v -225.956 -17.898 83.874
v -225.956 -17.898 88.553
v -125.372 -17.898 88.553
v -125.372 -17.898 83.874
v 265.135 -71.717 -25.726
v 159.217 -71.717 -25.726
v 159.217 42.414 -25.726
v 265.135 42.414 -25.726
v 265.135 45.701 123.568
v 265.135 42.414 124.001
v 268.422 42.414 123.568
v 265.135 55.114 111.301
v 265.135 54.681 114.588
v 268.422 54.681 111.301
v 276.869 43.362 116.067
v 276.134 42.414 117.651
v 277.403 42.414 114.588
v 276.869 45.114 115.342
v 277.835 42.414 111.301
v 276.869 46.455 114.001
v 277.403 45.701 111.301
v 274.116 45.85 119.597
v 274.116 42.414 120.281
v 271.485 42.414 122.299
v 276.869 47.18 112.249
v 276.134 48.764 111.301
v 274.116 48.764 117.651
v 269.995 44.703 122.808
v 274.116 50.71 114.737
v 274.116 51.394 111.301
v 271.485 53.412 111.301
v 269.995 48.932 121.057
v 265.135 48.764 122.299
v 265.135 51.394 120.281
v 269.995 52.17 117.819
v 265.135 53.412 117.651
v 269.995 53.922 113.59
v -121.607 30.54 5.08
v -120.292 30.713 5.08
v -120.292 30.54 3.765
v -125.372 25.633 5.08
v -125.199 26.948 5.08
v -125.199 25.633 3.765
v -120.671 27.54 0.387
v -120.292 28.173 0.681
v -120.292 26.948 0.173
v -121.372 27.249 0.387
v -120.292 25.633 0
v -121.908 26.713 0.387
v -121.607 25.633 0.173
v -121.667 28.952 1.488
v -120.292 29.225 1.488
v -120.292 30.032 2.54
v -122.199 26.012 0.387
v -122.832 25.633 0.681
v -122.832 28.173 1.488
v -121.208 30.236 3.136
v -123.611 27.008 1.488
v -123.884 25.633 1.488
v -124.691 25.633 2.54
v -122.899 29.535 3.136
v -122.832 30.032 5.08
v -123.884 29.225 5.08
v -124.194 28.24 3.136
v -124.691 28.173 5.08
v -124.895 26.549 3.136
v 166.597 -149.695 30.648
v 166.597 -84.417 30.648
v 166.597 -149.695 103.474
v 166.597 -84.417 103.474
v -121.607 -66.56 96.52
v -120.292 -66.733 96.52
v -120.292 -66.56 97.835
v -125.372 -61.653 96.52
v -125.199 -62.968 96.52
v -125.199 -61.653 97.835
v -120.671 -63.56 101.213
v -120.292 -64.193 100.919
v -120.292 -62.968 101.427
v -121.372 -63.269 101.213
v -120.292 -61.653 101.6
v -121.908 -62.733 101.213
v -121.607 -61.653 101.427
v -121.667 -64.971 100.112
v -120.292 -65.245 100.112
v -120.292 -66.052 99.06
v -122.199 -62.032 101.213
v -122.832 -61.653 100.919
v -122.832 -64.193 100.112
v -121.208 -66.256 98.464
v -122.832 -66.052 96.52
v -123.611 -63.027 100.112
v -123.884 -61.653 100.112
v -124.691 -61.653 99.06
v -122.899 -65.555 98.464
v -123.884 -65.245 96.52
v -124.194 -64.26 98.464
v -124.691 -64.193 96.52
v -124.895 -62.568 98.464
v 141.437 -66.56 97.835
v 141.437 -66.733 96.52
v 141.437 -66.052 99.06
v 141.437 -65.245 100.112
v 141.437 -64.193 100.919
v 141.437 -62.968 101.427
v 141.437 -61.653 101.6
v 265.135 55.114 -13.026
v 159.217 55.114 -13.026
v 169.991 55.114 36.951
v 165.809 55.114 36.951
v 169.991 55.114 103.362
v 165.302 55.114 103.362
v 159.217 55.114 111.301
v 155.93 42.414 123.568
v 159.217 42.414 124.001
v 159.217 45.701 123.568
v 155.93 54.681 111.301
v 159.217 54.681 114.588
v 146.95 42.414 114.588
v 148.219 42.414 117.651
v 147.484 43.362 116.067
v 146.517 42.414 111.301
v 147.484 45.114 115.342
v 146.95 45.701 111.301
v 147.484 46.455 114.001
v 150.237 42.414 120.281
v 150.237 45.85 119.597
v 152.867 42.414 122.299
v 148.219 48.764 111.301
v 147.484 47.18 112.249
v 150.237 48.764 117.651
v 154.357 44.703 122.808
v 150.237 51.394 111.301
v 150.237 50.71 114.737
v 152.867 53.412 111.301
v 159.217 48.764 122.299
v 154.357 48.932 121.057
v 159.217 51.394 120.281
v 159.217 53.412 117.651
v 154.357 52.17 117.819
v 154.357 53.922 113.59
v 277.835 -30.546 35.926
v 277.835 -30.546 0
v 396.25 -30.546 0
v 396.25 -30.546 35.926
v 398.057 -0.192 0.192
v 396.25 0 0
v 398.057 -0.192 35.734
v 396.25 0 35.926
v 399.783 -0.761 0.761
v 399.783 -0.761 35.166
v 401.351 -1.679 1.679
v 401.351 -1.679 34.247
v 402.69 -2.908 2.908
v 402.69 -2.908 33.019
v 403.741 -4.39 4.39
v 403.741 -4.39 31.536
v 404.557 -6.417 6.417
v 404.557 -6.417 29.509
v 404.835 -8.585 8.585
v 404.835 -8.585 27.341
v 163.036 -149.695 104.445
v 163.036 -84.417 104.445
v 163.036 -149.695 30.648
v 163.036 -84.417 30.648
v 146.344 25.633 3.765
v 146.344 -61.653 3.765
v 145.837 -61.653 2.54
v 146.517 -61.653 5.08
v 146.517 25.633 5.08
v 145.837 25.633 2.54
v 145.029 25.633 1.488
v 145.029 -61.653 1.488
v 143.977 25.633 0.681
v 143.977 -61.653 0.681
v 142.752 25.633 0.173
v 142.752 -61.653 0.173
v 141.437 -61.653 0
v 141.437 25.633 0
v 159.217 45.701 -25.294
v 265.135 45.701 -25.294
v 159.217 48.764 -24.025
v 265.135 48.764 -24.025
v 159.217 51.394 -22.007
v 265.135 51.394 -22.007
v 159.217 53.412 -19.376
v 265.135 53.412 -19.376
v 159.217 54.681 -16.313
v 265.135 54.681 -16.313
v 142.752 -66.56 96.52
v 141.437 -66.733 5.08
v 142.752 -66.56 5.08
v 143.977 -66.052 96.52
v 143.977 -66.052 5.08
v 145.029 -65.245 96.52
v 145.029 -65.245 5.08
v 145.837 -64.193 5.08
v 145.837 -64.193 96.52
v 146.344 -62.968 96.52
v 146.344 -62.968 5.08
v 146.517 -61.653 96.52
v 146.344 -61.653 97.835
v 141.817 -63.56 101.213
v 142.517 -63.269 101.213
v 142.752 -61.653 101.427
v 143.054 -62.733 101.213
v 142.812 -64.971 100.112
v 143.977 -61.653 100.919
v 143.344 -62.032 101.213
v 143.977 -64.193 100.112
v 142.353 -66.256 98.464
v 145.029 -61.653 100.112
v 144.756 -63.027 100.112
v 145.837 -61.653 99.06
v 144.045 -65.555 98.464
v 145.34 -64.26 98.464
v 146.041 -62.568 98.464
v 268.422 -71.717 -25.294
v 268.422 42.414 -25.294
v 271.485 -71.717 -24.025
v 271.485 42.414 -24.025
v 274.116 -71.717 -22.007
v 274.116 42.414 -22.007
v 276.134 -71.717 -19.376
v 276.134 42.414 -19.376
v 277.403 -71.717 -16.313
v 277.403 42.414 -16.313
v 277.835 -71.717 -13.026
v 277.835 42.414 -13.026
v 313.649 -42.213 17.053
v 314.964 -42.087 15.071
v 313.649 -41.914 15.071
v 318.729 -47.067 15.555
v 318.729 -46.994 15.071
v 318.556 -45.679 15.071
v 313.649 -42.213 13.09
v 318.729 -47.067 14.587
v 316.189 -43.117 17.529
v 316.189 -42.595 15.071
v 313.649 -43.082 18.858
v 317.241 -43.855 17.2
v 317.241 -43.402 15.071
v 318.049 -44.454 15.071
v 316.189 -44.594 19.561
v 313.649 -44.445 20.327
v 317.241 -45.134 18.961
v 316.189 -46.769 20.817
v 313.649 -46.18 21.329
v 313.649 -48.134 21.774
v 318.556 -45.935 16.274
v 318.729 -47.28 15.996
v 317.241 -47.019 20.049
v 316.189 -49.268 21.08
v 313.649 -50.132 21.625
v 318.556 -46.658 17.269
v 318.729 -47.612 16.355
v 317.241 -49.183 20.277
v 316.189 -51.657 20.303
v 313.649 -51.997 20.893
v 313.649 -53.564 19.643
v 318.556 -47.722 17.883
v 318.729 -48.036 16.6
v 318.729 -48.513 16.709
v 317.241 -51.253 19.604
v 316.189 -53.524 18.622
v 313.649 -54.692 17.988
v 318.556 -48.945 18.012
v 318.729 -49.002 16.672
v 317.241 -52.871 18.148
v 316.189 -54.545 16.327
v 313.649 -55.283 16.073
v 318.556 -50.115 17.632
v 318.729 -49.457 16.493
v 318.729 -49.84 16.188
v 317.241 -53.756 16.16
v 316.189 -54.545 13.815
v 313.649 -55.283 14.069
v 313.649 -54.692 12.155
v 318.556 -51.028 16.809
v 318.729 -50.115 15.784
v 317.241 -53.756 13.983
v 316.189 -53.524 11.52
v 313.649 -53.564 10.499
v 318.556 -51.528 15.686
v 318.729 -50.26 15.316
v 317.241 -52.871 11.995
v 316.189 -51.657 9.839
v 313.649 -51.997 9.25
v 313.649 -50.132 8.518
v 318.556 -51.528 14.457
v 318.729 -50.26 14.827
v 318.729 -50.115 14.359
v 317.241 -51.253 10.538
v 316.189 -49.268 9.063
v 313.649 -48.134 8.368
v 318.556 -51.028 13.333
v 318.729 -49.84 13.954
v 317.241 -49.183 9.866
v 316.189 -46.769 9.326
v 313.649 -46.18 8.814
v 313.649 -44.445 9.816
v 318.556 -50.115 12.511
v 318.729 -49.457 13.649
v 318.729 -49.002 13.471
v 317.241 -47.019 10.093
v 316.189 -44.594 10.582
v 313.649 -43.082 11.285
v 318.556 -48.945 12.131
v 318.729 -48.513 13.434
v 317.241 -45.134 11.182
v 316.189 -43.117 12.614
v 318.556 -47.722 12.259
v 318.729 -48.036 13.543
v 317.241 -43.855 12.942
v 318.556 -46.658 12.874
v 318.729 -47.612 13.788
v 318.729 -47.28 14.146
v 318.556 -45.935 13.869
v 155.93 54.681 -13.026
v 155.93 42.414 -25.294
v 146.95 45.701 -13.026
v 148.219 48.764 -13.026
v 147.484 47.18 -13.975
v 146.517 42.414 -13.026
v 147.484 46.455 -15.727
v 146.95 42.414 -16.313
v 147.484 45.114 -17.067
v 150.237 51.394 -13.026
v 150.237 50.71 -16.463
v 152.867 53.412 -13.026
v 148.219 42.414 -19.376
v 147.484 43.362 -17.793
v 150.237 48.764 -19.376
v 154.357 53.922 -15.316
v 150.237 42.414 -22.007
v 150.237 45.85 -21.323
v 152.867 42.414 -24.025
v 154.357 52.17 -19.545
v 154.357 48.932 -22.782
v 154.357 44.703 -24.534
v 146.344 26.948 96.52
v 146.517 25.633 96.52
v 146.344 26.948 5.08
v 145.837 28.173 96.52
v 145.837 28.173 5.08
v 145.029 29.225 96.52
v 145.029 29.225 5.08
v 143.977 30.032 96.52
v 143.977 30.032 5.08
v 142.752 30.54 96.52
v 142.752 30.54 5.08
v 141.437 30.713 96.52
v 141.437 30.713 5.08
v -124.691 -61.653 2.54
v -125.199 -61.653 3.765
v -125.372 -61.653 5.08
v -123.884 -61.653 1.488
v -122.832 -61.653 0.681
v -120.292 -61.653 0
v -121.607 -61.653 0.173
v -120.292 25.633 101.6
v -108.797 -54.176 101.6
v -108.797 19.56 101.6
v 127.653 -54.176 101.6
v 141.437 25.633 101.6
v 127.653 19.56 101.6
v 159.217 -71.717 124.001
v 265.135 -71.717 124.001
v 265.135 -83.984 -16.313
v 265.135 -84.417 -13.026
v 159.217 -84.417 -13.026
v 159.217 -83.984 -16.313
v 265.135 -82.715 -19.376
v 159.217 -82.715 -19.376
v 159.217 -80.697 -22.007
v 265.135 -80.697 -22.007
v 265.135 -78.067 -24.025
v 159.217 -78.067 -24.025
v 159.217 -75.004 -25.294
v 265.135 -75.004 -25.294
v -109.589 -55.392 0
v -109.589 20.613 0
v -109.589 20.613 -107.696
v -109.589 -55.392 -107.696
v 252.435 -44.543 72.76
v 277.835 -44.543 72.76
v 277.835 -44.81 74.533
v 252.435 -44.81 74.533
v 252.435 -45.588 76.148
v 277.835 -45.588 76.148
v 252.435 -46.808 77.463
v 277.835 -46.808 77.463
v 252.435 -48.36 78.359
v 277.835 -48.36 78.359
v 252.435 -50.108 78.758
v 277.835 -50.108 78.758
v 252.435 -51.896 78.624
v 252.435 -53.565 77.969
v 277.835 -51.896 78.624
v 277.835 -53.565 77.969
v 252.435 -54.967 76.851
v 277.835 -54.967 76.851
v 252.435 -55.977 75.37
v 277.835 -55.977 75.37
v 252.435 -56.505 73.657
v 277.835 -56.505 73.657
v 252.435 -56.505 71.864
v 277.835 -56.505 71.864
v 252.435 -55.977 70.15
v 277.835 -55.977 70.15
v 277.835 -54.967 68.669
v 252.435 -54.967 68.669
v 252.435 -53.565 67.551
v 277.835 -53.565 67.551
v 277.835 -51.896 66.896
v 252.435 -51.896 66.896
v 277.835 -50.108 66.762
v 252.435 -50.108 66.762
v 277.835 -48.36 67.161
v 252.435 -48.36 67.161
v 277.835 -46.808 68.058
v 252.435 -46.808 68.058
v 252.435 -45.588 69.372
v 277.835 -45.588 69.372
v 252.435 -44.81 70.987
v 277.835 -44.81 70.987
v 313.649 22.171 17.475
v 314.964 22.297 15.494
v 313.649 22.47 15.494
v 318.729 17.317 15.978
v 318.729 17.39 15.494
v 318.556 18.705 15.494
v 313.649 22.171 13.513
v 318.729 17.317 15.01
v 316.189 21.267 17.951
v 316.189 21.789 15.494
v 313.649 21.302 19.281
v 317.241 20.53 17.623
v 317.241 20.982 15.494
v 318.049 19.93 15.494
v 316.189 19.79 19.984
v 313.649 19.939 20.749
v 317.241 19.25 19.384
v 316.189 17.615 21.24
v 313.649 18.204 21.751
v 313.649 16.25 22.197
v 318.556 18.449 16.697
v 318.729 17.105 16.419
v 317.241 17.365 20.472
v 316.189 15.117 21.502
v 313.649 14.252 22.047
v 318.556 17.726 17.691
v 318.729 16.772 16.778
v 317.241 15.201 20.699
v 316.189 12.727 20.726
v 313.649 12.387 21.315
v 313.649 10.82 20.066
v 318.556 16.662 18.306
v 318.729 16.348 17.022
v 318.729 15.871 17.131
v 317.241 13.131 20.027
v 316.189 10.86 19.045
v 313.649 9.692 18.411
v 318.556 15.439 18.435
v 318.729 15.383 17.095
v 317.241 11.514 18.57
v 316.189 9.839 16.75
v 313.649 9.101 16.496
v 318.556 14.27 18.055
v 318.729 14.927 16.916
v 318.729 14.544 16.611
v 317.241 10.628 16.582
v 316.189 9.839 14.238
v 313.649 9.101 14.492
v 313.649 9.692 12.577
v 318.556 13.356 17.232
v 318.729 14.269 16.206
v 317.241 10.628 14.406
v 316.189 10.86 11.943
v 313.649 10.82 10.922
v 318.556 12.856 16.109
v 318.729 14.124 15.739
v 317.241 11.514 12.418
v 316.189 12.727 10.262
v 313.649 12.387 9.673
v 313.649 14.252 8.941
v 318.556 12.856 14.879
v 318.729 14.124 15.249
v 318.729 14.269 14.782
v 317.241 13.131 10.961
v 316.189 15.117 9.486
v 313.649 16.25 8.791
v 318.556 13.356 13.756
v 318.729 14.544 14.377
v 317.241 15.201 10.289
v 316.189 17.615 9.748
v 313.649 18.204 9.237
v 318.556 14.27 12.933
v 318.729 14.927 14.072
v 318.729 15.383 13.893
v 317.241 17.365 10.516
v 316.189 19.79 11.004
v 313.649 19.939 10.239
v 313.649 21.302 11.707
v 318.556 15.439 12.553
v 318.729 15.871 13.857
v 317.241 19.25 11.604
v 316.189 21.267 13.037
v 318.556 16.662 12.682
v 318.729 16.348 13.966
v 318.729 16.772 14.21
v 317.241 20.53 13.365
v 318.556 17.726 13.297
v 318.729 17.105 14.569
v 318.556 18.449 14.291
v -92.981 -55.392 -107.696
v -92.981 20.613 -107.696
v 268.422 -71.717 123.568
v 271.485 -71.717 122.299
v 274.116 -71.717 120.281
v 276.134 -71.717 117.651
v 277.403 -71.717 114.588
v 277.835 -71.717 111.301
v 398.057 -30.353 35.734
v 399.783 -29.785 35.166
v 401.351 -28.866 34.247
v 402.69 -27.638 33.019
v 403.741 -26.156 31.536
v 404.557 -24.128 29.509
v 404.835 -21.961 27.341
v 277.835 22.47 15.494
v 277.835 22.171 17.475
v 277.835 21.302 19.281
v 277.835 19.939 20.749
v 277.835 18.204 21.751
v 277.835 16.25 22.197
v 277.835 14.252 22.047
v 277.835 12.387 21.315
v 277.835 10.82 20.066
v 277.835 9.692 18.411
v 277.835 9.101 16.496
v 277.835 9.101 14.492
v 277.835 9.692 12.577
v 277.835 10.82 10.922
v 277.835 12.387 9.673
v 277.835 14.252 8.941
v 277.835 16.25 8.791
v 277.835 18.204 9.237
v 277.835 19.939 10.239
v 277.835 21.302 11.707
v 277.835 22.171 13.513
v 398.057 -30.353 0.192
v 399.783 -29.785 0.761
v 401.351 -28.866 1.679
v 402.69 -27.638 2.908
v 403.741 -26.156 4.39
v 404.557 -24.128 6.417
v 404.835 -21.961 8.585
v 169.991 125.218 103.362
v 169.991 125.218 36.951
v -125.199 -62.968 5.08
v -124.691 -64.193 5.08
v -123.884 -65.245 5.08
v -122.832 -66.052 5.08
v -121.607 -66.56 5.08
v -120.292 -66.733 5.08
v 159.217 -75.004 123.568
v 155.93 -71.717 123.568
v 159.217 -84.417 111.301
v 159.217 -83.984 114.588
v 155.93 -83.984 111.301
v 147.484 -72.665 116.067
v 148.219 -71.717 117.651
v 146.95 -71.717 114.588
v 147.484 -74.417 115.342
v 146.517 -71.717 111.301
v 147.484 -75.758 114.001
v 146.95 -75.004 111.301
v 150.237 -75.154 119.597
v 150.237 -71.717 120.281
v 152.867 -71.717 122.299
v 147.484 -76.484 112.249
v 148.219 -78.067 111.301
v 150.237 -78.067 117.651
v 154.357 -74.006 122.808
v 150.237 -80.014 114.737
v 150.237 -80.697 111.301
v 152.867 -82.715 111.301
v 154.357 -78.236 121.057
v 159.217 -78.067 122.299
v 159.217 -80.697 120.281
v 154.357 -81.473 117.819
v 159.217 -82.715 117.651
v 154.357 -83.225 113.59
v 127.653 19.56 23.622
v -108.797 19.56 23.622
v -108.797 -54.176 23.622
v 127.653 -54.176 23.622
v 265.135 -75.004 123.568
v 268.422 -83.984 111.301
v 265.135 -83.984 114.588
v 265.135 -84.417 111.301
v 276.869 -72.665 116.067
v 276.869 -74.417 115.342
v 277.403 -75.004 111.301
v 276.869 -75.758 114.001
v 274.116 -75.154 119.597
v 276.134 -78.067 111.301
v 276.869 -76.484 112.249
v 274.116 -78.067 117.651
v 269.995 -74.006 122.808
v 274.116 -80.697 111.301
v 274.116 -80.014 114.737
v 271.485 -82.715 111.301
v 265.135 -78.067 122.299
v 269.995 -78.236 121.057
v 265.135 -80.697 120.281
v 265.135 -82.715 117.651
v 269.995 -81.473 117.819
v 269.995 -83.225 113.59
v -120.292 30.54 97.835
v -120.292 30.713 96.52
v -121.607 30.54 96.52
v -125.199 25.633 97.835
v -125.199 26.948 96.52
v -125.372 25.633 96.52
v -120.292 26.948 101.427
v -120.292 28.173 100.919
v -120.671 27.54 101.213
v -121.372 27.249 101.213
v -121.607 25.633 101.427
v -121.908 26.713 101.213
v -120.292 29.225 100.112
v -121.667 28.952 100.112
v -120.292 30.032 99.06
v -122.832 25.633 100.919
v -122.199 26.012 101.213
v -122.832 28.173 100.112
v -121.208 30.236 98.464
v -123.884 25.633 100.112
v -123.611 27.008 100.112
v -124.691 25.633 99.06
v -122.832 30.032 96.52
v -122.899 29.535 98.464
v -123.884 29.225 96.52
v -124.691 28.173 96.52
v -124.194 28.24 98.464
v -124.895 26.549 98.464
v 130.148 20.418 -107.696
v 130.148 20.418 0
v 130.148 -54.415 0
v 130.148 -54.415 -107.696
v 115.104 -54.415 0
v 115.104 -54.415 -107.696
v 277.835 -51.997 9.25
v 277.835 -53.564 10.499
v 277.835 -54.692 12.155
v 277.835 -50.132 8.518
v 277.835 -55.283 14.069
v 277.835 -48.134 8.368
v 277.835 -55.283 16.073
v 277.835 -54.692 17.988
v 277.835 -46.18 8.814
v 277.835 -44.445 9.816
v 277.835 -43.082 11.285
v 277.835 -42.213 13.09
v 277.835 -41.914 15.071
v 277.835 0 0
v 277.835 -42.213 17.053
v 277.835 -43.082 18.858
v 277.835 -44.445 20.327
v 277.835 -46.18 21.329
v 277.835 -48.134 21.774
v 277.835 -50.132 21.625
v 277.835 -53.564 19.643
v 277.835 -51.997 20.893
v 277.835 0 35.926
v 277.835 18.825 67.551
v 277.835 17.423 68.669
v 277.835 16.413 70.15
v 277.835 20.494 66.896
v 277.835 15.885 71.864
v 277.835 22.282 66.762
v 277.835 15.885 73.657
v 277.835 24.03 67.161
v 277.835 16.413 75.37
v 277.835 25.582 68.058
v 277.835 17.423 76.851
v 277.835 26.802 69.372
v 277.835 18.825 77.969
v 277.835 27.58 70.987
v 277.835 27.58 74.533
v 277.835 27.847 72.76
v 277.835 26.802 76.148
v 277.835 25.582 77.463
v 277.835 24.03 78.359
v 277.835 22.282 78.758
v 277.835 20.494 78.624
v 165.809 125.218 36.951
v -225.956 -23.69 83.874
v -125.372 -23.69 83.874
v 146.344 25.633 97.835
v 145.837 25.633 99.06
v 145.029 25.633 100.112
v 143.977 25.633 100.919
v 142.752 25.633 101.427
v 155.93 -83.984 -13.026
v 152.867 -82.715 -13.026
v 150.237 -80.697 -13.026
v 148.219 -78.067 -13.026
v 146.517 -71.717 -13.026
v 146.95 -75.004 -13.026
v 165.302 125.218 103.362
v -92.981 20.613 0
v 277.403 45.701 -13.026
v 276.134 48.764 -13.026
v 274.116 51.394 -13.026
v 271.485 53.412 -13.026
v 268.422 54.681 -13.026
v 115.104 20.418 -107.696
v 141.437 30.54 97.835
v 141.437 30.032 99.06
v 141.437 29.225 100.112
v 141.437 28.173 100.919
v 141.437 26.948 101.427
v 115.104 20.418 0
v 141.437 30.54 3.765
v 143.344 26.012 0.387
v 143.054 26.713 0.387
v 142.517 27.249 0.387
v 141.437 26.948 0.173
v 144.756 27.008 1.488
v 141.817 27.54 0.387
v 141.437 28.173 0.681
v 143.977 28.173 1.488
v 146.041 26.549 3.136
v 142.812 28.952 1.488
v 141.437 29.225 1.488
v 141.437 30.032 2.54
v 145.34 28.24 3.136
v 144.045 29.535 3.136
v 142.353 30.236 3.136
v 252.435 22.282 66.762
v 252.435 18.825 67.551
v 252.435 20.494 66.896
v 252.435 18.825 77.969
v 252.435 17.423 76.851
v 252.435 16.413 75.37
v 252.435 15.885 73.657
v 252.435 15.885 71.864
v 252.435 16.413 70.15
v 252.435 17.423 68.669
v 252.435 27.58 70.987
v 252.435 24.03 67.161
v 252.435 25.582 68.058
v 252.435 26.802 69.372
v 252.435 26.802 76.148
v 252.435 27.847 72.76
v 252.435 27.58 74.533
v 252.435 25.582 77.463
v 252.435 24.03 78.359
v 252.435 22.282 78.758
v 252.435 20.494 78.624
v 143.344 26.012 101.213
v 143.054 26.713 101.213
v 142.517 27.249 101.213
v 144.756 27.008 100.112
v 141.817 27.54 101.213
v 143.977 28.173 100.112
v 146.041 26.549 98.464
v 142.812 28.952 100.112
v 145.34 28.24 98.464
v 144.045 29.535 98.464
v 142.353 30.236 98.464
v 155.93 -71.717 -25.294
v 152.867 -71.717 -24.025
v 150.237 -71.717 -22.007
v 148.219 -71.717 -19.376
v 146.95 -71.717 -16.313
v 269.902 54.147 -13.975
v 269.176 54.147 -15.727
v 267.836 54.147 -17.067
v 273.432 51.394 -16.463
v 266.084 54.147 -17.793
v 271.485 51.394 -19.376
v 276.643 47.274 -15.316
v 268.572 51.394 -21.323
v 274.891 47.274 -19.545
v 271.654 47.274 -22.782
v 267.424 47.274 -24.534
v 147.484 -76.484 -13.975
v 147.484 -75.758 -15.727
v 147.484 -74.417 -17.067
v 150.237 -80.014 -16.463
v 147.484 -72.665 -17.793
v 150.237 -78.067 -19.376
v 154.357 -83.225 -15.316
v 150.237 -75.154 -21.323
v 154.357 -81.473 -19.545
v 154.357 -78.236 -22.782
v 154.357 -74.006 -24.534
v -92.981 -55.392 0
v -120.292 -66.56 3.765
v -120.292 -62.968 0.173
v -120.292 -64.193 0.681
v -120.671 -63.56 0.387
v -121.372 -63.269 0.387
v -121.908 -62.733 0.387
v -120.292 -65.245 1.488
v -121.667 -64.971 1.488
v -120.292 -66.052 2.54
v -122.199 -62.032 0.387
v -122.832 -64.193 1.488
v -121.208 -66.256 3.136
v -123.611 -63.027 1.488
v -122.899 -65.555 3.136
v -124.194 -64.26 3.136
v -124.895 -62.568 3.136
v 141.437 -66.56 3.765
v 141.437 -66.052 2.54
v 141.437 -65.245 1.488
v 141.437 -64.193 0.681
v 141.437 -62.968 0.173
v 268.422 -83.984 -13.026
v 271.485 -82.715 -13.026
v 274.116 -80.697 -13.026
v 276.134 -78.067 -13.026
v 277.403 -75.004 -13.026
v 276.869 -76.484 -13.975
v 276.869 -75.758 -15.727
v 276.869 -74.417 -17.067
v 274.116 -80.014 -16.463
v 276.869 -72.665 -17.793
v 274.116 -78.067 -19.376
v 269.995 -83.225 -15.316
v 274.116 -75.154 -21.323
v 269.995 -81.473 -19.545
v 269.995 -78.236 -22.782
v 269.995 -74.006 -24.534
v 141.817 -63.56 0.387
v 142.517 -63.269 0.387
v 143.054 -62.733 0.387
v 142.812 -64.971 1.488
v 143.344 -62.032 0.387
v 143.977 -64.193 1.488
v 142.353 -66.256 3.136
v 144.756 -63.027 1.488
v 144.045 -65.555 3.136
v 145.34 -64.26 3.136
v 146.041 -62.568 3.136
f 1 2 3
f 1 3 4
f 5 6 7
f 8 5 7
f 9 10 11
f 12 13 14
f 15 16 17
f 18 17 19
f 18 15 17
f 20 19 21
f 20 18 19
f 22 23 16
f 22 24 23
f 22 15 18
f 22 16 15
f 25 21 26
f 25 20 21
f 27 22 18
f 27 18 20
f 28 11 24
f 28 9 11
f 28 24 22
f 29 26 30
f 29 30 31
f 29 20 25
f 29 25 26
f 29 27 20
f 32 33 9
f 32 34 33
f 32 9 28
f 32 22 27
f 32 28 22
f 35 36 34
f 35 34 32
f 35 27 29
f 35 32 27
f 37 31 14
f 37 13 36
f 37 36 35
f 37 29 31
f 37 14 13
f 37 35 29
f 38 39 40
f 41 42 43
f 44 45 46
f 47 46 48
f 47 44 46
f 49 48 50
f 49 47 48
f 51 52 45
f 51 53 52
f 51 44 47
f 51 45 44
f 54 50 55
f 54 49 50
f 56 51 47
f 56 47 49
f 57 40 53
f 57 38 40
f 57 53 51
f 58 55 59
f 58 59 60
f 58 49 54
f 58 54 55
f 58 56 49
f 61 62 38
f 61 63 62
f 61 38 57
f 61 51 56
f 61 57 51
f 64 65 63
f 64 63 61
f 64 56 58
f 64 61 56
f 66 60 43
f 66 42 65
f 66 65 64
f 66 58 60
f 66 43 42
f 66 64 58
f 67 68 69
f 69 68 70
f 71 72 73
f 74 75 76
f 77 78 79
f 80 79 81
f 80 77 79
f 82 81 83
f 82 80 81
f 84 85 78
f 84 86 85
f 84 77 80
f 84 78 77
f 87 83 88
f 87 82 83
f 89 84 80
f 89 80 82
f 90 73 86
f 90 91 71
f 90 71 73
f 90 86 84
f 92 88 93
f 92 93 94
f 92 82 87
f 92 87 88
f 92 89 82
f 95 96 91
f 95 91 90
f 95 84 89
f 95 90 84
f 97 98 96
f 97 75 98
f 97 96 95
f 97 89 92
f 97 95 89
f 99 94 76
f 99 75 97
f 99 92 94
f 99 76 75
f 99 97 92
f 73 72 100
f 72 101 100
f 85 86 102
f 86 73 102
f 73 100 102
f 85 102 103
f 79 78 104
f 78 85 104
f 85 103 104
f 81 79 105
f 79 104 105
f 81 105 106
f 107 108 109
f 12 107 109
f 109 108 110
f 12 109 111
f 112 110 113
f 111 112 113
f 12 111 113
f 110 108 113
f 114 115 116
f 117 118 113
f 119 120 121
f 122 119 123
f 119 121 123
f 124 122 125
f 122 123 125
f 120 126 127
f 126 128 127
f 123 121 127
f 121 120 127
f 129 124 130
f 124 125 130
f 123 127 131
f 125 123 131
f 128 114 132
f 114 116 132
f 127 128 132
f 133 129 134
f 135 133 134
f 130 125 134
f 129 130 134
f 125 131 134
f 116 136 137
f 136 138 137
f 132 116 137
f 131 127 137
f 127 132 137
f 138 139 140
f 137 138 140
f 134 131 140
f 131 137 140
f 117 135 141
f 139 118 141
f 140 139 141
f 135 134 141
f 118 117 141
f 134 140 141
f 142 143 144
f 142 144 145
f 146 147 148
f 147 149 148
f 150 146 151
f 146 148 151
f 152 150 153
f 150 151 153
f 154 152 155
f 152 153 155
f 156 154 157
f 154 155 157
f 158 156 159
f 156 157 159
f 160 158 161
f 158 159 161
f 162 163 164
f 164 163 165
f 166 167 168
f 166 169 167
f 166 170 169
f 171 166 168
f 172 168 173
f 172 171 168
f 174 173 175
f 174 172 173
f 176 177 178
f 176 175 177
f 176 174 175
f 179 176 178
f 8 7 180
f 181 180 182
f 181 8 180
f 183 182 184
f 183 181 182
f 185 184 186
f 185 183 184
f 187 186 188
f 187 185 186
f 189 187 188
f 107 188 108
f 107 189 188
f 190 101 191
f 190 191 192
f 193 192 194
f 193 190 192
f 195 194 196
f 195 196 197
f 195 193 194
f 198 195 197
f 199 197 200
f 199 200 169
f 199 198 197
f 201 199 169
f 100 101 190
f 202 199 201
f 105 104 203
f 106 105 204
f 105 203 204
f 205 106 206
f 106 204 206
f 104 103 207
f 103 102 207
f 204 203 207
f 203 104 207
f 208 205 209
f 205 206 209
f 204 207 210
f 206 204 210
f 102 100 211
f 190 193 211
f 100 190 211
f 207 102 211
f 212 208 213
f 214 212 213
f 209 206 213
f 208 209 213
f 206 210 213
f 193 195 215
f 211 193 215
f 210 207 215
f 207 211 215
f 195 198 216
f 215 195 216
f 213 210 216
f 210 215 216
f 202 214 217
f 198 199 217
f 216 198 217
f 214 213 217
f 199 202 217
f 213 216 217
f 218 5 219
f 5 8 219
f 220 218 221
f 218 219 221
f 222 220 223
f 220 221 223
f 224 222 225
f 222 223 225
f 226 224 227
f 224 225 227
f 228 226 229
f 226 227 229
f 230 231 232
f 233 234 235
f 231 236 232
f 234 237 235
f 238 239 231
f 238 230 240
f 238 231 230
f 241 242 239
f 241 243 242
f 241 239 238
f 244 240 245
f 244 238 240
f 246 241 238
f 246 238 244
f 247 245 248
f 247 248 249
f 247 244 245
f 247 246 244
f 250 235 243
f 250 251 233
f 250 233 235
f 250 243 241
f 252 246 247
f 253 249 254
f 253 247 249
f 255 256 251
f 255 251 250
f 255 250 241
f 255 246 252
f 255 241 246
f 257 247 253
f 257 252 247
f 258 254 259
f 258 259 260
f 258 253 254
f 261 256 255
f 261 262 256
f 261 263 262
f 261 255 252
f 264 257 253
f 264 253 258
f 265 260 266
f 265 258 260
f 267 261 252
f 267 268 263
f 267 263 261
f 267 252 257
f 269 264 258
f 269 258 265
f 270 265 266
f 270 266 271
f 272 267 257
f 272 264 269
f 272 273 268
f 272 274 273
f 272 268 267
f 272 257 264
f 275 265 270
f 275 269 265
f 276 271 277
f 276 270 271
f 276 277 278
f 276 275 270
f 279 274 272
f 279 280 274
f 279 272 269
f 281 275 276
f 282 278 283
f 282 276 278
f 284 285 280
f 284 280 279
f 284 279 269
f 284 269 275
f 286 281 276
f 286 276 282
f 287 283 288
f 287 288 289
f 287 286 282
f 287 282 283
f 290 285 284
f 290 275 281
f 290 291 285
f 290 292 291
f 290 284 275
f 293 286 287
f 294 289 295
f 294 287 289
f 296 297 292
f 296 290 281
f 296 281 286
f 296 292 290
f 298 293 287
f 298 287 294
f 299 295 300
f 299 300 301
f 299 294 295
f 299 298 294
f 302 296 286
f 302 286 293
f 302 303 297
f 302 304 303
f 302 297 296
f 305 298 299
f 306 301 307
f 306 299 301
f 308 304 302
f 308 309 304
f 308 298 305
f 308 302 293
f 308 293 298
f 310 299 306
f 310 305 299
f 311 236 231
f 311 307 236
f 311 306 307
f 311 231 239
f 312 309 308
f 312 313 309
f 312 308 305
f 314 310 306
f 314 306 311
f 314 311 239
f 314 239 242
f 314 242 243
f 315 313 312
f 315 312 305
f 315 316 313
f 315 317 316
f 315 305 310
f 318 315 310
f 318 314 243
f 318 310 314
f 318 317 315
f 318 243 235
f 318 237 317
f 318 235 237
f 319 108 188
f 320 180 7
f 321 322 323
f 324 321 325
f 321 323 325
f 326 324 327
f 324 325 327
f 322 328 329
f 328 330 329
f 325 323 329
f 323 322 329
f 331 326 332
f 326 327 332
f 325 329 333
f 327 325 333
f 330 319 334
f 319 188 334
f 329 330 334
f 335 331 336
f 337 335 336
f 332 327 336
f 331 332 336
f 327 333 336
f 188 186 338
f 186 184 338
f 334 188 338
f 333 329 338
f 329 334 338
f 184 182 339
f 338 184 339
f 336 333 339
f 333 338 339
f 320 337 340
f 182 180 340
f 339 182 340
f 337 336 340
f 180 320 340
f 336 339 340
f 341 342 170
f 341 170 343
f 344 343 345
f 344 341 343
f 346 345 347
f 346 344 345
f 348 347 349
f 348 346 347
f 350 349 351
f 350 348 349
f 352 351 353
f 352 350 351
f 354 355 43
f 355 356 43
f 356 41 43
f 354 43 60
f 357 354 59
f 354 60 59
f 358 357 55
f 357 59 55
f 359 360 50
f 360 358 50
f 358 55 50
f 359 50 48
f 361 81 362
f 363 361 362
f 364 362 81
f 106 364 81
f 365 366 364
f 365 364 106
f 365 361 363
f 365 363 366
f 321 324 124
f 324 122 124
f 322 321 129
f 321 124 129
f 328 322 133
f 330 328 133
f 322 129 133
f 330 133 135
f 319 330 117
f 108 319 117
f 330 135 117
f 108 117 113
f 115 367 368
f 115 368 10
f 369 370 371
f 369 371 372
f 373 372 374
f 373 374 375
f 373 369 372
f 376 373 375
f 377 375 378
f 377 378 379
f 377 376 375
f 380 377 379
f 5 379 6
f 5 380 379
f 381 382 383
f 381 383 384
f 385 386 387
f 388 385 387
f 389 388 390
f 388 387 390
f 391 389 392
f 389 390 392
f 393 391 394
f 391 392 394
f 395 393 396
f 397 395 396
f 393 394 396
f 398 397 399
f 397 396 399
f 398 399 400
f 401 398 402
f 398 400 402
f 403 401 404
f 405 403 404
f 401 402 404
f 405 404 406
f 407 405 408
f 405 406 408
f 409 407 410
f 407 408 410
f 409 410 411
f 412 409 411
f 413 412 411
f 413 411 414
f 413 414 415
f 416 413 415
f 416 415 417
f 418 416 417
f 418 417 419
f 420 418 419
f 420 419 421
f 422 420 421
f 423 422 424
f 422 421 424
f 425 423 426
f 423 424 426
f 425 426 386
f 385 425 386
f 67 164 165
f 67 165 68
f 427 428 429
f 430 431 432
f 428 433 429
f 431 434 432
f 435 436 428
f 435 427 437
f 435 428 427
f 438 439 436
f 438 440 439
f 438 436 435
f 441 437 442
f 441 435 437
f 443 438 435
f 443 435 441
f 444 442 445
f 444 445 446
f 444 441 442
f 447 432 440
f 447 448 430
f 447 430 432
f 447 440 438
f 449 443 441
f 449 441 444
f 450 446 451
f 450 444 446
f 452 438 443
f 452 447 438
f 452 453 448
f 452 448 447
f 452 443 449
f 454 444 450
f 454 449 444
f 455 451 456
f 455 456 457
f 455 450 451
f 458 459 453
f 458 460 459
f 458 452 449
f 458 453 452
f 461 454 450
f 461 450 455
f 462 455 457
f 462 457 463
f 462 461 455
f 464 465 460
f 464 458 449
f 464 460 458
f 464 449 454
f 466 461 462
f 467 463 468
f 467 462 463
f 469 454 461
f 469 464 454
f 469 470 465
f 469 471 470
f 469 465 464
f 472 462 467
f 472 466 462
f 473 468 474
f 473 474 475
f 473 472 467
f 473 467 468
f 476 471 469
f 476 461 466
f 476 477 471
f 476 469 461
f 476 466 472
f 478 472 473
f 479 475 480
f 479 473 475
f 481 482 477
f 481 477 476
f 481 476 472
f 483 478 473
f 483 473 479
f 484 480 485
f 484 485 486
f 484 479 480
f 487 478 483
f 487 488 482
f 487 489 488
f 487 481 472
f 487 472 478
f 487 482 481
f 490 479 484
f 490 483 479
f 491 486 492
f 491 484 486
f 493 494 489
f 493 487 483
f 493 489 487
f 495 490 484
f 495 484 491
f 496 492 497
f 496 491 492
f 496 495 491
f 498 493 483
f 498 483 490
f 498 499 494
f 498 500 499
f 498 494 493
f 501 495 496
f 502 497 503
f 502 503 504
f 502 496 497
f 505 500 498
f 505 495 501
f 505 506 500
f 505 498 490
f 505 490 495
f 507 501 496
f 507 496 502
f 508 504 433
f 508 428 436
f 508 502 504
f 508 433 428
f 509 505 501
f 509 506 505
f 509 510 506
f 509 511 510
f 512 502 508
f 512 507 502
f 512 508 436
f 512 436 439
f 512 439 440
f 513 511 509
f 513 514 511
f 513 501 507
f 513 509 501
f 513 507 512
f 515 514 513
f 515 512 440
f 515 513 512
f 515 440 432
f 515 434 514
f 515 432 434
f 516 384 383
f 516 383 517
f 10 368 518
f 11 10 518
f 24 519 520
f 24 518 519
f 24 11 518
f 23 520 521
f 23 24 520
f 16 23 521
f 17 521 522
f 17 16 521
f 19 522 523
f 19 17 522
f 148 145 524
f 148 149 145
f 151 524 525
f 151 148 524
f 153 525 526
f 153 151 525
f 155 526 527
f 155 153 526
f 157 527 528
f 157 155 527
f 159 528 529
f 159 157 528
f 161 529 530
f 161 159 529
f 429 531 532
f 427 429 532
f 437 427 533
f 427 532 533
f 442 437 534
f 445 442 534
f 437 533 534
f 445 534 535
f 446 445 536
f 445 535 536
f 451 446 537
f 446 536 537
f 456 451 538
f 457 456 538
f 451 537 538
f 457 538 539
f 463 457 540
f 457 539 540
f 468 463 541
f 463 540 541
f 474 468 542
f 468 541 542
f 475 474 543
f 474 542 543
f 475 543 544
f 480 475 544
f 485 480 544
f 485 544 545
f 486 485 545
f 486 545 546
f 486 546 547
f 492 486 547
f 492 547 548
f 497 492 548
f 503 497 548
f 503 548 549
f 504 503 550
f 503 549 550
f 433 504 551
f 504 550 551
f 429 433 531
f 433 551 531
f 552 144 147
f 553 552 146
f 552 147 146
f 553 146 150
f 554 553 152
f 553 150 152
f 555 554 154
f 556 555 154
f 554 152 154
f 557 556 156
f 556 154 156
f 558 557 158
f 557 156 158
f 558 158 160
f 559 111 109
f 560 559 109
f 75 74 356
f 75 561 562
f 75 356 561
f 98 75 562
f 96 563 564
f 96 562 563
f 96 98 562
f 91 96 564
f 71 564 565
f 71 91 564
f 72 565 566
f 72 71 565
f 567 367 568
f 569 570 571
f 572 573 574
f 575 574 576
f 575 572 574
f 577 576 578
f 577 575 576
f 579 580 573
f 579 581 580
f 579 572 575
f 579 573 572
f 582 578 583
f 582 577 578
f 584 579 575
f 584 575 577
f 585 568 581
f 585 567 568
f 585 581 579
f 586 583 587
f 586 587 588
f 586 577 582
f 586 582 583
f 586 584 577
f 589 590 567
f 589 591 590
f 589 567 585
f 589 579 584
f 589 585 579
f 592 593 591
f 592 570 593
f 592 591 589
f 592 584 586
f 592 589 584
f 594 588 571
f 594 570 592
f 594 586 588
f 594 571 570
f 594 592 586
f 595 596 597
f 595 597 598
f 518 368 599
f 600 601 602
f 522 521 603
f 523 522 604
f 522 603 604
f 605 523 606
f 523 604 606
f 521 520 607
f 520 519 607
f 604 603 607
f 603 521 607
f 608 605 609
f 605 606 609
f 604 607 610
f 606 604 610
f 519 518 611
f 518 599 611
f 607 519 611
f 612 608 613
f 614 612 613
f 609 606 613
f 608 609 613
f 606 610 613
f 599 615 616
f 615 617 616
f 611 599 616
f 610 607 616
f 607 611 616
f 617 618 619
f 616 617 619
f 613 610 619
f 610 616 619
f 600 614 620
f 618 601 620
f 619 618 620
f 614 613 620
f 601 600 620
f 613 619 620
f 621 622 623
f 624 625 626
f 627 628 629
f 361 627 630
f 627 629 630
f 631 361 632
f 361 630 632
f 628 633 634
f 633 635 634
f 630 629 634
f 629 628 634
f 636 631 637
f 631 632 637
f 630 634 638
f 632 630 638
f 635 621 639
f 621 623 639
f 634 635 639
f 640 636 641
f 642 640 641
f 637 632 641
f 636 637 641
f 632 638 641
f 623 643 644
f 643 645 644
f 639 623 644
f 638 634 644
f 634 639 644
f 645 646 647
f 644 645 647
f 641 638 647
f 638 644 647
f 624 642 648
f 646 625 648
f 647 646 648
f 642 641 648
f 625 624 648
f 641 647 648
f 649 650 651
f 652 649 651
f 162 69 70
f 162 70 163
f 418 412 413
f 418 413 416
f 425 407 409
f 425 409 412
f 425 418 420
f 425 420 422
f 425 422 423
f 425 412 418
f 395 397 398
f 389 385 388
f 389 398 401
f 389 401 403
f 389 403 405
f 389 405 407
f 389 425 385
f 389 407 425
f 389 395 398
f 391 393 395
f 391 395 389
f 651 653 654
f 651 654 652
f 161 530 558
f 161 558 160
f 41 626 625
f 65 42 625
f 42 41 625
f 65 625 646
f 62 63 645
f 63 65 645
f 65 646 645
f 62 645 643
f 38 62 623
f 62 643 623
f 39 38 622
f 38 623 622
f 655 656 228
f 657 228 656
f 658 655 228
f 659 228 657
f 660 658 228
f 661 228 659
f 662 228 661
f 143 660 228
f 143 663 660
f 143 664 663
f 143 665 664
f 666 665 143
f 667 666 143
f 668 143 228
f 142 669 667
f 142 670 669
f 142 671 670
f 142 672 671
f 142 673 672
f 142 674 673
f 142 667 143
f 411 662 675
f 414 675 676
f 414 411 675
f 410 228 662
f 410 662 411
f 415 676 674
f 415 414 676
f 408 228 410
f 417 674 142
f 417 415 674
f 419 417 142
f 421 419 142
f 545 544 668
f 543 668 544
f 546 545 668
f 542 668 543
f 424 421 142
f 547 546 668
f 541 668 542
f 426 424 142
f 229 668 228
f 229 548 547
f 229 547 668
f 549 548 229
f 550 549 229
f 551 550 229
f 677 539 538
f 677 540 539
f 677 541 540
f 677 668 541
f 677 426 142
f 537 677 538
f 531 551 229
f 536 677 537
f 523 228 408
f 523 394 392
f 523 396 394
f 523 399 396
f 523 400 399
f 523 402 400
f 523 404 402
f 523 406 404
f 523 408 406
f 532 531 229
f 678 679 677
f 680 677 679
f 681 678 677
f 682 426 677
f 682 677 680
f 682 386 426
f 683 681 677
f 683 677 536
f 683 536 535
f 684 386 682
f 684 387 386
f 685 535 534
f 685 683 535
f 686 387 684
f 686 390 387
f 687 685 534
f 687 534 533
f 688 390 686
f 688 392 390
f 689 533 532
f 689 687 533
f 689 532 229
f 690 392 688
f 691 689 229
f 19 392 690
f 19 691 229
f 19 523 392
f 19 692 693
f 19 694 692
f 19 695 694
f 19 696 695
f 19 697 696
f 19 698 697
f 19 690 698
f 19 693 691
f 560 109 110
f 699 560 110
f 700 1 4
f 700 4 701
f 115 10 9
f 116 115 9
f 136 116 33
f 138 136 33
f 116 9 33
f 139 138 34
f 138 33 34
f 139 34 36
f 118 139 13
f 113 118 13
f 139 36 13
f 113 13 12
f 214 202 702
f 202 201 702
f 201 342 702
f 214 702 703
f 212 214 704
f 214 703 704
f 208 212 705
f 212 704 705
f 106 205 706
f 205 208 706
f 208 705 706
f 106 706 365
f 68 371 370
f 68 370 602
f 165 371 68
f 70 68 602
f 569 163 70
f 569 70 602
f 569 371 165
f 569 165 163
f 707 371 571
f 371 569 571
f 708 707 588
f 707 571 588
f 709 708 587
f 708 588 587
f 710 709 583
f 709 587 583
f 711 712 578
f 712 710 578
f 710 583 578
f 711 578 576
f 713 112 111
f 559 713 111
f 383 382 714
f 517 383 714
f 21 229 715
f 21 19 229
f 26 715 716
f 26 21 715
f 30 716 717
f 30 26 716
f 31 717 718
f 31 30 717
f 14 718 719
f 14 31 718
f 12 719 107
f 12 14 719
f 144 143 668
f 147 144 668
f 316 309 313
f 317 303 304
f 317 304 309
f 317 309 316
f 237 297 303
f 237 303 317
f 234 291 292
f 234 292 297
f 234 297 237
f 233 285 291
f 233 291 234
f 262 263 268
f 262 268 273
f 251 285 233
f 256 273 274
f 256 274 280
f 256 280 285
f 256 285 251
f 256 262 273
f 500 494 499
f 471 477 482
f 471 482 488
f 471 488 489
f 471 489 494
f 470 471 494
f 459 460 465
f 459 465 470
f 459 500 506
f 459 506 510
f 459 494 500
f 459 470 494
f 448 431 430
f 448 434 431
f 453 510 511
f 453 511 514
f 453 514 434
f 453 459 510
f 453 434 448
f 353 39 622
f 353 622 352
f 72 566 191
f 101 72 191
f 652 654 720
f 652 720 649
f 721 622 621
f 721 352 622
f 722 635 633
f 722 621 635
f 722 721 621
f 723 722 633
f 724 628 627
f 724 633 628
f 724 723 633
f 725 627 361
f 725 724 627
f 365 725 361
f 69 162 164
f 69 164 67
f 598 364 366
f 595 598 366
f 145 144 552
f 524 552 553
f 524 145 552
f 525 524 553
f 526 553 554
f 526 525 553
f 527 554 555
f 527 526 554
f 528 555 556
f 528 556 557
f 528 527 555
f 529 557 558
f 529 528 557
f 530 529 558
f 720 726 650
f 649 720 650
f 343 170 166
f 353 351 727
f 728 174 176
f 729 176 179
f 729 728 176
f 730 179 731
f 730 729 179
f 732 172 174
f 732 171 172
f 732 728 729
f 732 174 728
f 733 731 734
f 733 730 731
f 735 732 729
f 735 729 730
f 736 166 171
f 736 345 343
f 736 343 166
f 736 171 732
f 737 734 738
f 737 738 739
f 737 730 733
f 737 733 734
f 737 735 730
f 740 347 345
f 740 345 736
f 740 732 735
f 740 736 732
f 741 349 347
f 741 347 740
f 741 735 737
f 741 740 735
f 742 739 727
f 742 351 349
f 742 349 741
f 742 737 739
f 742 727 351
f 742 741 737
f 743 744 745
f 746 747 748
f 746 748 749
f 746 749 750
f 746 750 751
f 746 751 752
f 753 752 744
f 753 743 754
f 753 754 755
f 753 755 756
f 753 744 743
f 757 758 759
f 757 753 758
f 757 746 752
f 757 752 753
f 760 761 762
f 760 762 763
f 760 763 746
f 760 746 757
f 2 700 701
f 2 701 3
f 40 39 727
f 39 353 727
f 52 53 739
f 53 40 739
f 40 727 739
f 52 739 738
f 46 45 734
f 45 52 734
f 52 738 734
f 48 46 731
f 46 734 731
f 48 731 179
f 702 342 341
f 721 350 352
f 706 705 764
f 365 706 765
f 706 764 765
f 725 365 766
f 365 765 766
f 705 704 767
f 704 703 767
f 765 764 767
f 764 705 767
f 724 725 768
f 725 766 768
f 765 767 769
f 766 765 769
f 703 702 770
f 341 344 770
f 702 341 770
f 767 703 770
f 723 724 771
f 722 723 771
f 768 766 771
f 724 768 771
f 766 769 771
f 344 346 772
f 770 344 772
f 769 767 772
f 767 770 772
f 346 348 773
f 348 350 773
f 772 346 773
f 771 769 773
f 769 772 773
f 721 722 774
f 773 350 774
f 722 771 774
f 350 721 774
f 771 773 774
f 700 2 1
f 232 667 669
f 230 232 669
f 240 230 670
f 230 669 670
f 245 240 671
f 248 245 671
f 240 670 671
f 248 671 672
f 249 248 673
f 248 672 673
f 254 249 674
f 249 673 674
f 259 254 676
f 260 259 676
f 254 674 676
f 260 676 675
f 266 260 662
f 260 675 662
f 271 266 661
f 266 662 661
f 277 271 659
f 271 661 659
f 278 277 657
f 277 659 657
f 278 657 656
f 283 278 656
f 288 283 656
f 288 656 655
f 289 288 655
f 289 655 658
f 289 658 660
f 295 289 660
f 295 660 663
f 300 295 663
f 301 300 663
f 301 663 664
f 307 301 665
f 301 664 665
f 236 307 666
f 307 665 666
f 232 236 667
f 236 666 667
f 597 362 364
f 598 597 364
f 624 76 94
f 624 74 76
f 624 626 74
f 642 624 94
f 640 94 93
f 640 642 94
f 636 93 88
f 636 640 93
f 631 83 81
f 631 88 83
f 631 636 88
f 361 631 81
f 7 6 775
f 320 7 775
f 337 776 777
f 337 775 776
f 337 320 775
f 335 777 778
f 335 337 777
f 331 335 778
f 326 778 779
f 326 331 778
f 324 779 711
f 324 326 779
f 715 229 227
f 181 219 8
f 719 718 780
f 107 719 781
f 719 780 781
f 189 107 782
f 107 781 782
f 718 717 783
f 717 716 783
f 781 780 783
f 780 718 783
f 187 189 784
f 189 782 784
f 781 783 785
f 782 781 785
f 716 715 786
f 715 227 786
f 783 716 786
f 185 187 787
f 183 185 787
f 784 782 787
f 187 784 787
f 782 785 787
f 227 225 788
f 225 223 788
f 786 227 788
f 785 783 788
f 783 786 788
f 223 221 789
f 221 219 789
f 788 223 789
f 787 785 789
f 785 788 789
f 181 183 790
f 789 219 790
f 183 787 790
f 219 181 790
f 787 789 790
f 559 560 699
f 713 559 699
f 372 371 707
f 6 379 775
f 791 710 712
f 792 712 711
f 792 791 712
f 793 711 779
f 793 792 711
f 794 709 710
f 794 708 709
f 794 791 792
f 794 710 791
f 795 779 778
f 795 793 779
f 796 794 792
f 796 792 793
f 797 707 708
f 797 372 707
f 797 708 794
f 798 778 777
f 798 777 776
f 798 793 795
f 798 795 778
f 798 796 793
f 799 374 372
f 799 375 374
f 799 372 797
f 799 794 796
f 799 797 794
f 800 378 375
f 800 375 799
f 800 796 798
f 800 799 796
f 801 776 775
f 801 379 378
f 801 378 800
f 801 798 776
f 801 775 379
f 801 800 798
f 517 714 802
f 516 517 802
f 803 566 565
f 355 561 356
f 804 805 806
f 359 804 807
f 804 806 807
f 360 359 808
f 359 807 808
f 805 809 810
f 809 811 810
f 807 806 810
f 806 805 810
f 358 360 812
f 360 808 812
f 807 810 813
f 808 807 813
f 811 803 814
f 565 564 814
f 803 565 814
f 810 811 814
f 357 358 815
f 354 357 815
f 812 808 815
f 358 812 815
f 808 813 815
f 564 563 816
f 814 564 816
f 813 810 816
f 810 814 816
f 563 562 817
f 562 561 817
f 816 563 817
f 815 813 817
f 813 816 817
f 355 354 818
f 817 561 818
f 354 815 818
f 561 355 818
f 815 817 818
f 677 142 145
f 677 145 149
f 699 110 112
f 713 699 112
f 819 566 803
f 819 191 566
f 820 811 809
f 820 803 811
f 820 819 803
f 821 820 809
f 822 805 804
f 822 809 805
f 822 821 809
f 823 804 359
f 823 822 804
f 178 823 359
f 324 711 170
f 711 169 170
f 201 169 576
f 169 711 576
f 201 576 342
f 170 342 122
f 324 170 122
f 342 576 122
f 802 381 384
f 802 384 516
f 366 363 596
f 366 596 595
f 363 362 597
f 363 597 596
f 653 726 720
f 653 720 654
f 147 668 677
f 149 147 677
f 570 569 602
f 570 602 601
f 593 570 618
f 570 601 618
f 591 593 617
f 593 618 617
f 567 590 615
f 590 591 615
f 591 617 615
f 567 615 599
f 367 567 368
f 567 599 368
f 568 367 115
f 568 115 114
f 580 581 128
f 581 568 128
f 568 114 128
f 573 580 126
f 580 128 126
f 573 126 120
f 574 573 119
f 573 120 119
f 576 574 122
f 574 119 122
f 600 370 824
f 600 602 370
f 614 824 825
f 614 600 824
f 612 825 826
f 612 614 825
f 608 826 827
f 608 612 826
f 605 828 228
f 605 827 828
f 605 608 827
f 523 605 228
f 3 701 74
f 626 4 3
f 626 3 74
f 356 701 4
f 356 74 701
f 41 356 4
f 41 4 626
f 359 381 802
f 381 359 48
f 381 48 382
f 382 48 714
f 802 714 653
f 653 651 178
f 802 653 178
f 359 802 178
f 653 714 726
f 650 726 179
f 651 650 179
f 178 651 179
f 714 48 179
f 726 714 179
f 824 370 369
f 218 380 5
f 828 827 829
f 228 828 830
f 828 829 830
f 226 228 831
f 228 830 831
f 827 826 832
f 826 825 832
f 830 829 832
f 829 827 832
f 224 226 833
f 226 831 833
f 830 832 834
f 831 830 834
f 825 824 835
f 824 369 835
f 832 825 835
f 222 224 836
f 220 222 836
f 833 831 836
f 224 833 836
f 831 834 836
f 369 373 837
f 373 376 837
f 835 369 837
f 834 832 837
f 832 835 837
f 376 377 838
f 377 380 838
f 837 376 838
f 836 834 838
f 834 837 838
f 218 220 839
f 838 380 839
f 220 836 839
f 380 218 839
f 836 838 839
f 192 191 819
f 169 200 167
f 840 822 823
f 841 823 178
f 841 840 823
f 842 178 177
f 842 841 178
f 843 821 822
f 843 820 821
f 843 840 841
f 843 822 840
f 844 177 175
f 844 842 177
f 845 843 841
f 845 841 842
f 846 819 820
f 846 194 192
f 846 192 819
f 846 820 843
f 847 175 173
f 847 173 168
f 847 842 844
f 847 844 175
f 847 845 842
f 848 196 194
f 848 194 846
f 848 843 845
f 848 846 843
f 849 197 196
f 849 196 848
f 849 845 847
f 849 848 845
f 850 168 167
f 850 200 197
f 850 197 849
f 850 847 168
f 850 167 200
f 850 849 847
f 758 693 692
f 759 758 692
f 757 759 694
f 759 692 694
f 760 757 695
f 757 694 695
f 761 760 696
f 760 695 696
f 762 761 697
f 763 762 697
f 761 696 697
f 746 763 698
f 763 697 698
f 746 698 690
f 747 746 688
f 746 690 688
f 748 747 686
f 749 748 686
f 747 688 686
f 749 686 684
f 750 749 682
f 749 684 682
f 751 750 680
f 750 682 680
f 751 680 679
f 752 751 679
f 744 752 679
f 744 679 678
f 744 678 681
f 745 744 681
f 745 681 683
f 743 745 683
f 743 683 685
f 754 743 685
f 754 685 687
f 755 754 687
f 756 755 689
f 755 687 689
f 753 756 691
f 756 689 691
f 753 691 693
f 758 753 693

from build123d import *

# Parameters (mm, degrees)
F0_W      = 271.8892842531
F0_H      = 97.4458288401
F1_DEPTH  = 101.6
F3_R      = 5.08
F4_W      = 16.6076868773
F4_H      = 76.0046169162
F5_DEPTH  = 107.696
F6_W      = 15.0446221232
F6_H      = 74.8323127627
F7_DEPTH  = 107.696
F2_W      = 236.4497035742
F2_H      = 73.7357586622
F8_DEPTH  = 77.978
F9_W      = 139.5306698978
F9_H      = 149.727134034
F10_DEPTH = 131.318
F11_R     = 12.7
F12_W     = 30.5456686765
F12_H     = 35.9262302518
F13_DEPTH = 127
F15_DEPTH = 65.278
F17_DEPTH = 70.104
F18_R     = 6.7219361341
F19_DEPTH = 40.894
F21_DEPTH = 100.584
F22_R     = 6.0147460443
F23_DEPTH = 25.4
F24_R     = 5.08
F25_R     = 8.5849434278


with BuildPart() as f1:
    # F0 (on Top) → F1 (new body)
    with BuildSketch(Plane.XY):
        with Locations((10.5727538466, -18.0099094287)):
            Rectangle(F0_W, F0_H)
    extrude(amount=F1_DEPTH)

    # F3
    f3_edges = [f1.edges().sort_by_distance(p)[0] for p in [
        (-125.371888, -66.732824, 50.8),
        (146.517396, -66.732824, 50.8),
        (10.572754, -66.732824, 0),
        (10.572754, -66.732824, 101.6),
        (146.517396, 30.713005, 50.8),
        (146.517396, -18.009909, 0),
        (146.517396, -18.009909, 101.6),
        (-125.371888, 30.713005, 50.8),
        (10.572754, 30.713005, 0),
        (10.572754, 30.713005, 101.6),
        (-125.371888, -18.009909, 0),
        (-125.371888, -18.009909, 101.6),
    ]]
    fillet(f3_edges, radius=F3_R)

    # F4 (on face) → F5 (join)
    with BuildSketch(Plane(origin=(0, 0, 0), x_dir=(1, 0, 0), z_dir=(0, 0, -1))):
        with Locations((-101.2849360704, 17.3892304301)):
            Rectangle(F4_W, F4_H)
    extrude(amount=F5_DEPTH)

    # F6 (on face) → F7 (join)
    with BuildSketch(Plane(origin=(0, 0, 0), x_dir=(1, 0, 0), z_dir=(0, 0, -1))):
        with Locations((122.6258315146, 16.998462379)):
            Rectangle(F6_W, F6_H)
    extrude(amount=F7_DEPTH)

    # F2 (on face) → F8 (cut)
    with BuildSketch(Plane.XY.offset(101.6)):
        with Locations((9.42825526, -17.3080377281)):
            Rectangle(F2_W, F2_H)
    extrude(amount=-F8_DEPTH, mode=Mode.SUBTRACT)

    # F9 (on face) → F10 (join)
    with BuildSketch(Plane.YZ.offset(146.5173959732)):
        with Locations((-14.6516356617, 49.1371015087)):
            Rectangle(F9_W, F9_H)
    extrude(amount=F10_DEPTH)

    # F11
    f11_edges = [f1.edges().sort_by_distance(p)[0] for p in [
        (212.176396, 55.113699, 124.000669),
        (212.176396, -84.416971, 124.000669),
        (146.517396, -14.651636, 124.000669),
        (277.835396, -14.651636, 124.000669),
        (212.176396, -84.416971, -25.726466),
        (146.517396, -84.416971, 49.137102),
        (277.835396, -84.416971, 49.137102),
        (277.835396, -14.651636, -25.726466),
        (277.835396, 55.113699, 49.137102),
        (212.176396, 55.113699, -25.726466),
        (146.517396, 55.113699, 49.137102),
        (146.517396, -14.651636, -25.726466),
    ]]
    fillet(f11_edges, radius=F11_R)

    # F12 (on face) → F13 (join)
    with BuildSketch(Plane.YZ.offset(277.8353959732)):
        with Locations((-15.2728343382, 17.9631151259)):
            Rectangle(F12_W, F12_H)
    extrude(amount=F13_DEPTH)

    # F14 (on face) → F15 (join)
    with BuildSketch(Plane.XZ.offset(84.4169706106)):
        Polygon((166.5966212749, 103.4740507603), (163.0362123251, 104.4450700283), (163.0362123251, 30.6476131082), (166.5966212749, 30.6476131082), align=None)
    extrude(amount=F15_DEPTH)

    # F16 (on face) → F17 (join)
    with BuildSketch(Plane(origin=(0, 55.1136992872, 0), x_dir=(-1, 0, 0), z_dir=(0, 1, 0))):
        Polygon((-165.8086842582, 36.9507782161), (-165.3019338846, 103.3622100949), (-169.9908971786, 103.3622100949), (-169.9908971786, 36.9507782161), align=None)
    extrude(amount=F17_DEPTH)

    # F18 (on face) → F19 (join)
    with BuildSketch(Plane.YZ.offset(277.8353959732)):
        with Locations((-48.636149615, 15.0712924078)):
            Circle(F18_R)
        with Locations((15.748, 15.494)):
            Circle(F18_R)
    extrude(amount=F19_DEPTH)

    # F20 (on face) → F21 (join)
    with BuildSketch(Plane(origin=(-125.3718882799, 0, 0), x_dir=(0, -1, 0), z_dir=(-1, 0, 0))):
        Polygon((23.6901119351, 83.874464035), (17.8975313902, 88.5533466935), (17.8975313902, 83.874464035), align=None)
    extrude(amount=F21_DEPTH)

    # F22 (on face) → F23 (cut)
    with BuildSketch(Plane.YZ.offset(277.8353959732)):
        with Locations((-50.5576916039, 72.7600604296)):
            Circle(F22_R)
        with Locations((21.8323083961, 72.7600604296)):
            Circle(F22_R)
    extrude(amount=-F23_DEPTH, mode=Mode.SUBTRACT)

    # F24
    f24_edges = [f1.edges().sort_by_distance(p)[0] for p in [
        (318.729396, -55.358086, 15.071292),
        (318.729396, 9.026064, 15.494),
    ]]
    fillet(f24_edges, radius=F24_R)

    # F25
    f25_edges = [f1.edges().sort_by_distance(p)[0] for p in [
        (404.835396, -15.272834, 35.92623),
        (404.835396, -30.545669, 17.963115),
        (404.835396, -15.272834, 0),
        (404.835396, 0, 17.963115),
    ]]
    fillet(f25_edges, radius=F25_R)


solid = f1.part
